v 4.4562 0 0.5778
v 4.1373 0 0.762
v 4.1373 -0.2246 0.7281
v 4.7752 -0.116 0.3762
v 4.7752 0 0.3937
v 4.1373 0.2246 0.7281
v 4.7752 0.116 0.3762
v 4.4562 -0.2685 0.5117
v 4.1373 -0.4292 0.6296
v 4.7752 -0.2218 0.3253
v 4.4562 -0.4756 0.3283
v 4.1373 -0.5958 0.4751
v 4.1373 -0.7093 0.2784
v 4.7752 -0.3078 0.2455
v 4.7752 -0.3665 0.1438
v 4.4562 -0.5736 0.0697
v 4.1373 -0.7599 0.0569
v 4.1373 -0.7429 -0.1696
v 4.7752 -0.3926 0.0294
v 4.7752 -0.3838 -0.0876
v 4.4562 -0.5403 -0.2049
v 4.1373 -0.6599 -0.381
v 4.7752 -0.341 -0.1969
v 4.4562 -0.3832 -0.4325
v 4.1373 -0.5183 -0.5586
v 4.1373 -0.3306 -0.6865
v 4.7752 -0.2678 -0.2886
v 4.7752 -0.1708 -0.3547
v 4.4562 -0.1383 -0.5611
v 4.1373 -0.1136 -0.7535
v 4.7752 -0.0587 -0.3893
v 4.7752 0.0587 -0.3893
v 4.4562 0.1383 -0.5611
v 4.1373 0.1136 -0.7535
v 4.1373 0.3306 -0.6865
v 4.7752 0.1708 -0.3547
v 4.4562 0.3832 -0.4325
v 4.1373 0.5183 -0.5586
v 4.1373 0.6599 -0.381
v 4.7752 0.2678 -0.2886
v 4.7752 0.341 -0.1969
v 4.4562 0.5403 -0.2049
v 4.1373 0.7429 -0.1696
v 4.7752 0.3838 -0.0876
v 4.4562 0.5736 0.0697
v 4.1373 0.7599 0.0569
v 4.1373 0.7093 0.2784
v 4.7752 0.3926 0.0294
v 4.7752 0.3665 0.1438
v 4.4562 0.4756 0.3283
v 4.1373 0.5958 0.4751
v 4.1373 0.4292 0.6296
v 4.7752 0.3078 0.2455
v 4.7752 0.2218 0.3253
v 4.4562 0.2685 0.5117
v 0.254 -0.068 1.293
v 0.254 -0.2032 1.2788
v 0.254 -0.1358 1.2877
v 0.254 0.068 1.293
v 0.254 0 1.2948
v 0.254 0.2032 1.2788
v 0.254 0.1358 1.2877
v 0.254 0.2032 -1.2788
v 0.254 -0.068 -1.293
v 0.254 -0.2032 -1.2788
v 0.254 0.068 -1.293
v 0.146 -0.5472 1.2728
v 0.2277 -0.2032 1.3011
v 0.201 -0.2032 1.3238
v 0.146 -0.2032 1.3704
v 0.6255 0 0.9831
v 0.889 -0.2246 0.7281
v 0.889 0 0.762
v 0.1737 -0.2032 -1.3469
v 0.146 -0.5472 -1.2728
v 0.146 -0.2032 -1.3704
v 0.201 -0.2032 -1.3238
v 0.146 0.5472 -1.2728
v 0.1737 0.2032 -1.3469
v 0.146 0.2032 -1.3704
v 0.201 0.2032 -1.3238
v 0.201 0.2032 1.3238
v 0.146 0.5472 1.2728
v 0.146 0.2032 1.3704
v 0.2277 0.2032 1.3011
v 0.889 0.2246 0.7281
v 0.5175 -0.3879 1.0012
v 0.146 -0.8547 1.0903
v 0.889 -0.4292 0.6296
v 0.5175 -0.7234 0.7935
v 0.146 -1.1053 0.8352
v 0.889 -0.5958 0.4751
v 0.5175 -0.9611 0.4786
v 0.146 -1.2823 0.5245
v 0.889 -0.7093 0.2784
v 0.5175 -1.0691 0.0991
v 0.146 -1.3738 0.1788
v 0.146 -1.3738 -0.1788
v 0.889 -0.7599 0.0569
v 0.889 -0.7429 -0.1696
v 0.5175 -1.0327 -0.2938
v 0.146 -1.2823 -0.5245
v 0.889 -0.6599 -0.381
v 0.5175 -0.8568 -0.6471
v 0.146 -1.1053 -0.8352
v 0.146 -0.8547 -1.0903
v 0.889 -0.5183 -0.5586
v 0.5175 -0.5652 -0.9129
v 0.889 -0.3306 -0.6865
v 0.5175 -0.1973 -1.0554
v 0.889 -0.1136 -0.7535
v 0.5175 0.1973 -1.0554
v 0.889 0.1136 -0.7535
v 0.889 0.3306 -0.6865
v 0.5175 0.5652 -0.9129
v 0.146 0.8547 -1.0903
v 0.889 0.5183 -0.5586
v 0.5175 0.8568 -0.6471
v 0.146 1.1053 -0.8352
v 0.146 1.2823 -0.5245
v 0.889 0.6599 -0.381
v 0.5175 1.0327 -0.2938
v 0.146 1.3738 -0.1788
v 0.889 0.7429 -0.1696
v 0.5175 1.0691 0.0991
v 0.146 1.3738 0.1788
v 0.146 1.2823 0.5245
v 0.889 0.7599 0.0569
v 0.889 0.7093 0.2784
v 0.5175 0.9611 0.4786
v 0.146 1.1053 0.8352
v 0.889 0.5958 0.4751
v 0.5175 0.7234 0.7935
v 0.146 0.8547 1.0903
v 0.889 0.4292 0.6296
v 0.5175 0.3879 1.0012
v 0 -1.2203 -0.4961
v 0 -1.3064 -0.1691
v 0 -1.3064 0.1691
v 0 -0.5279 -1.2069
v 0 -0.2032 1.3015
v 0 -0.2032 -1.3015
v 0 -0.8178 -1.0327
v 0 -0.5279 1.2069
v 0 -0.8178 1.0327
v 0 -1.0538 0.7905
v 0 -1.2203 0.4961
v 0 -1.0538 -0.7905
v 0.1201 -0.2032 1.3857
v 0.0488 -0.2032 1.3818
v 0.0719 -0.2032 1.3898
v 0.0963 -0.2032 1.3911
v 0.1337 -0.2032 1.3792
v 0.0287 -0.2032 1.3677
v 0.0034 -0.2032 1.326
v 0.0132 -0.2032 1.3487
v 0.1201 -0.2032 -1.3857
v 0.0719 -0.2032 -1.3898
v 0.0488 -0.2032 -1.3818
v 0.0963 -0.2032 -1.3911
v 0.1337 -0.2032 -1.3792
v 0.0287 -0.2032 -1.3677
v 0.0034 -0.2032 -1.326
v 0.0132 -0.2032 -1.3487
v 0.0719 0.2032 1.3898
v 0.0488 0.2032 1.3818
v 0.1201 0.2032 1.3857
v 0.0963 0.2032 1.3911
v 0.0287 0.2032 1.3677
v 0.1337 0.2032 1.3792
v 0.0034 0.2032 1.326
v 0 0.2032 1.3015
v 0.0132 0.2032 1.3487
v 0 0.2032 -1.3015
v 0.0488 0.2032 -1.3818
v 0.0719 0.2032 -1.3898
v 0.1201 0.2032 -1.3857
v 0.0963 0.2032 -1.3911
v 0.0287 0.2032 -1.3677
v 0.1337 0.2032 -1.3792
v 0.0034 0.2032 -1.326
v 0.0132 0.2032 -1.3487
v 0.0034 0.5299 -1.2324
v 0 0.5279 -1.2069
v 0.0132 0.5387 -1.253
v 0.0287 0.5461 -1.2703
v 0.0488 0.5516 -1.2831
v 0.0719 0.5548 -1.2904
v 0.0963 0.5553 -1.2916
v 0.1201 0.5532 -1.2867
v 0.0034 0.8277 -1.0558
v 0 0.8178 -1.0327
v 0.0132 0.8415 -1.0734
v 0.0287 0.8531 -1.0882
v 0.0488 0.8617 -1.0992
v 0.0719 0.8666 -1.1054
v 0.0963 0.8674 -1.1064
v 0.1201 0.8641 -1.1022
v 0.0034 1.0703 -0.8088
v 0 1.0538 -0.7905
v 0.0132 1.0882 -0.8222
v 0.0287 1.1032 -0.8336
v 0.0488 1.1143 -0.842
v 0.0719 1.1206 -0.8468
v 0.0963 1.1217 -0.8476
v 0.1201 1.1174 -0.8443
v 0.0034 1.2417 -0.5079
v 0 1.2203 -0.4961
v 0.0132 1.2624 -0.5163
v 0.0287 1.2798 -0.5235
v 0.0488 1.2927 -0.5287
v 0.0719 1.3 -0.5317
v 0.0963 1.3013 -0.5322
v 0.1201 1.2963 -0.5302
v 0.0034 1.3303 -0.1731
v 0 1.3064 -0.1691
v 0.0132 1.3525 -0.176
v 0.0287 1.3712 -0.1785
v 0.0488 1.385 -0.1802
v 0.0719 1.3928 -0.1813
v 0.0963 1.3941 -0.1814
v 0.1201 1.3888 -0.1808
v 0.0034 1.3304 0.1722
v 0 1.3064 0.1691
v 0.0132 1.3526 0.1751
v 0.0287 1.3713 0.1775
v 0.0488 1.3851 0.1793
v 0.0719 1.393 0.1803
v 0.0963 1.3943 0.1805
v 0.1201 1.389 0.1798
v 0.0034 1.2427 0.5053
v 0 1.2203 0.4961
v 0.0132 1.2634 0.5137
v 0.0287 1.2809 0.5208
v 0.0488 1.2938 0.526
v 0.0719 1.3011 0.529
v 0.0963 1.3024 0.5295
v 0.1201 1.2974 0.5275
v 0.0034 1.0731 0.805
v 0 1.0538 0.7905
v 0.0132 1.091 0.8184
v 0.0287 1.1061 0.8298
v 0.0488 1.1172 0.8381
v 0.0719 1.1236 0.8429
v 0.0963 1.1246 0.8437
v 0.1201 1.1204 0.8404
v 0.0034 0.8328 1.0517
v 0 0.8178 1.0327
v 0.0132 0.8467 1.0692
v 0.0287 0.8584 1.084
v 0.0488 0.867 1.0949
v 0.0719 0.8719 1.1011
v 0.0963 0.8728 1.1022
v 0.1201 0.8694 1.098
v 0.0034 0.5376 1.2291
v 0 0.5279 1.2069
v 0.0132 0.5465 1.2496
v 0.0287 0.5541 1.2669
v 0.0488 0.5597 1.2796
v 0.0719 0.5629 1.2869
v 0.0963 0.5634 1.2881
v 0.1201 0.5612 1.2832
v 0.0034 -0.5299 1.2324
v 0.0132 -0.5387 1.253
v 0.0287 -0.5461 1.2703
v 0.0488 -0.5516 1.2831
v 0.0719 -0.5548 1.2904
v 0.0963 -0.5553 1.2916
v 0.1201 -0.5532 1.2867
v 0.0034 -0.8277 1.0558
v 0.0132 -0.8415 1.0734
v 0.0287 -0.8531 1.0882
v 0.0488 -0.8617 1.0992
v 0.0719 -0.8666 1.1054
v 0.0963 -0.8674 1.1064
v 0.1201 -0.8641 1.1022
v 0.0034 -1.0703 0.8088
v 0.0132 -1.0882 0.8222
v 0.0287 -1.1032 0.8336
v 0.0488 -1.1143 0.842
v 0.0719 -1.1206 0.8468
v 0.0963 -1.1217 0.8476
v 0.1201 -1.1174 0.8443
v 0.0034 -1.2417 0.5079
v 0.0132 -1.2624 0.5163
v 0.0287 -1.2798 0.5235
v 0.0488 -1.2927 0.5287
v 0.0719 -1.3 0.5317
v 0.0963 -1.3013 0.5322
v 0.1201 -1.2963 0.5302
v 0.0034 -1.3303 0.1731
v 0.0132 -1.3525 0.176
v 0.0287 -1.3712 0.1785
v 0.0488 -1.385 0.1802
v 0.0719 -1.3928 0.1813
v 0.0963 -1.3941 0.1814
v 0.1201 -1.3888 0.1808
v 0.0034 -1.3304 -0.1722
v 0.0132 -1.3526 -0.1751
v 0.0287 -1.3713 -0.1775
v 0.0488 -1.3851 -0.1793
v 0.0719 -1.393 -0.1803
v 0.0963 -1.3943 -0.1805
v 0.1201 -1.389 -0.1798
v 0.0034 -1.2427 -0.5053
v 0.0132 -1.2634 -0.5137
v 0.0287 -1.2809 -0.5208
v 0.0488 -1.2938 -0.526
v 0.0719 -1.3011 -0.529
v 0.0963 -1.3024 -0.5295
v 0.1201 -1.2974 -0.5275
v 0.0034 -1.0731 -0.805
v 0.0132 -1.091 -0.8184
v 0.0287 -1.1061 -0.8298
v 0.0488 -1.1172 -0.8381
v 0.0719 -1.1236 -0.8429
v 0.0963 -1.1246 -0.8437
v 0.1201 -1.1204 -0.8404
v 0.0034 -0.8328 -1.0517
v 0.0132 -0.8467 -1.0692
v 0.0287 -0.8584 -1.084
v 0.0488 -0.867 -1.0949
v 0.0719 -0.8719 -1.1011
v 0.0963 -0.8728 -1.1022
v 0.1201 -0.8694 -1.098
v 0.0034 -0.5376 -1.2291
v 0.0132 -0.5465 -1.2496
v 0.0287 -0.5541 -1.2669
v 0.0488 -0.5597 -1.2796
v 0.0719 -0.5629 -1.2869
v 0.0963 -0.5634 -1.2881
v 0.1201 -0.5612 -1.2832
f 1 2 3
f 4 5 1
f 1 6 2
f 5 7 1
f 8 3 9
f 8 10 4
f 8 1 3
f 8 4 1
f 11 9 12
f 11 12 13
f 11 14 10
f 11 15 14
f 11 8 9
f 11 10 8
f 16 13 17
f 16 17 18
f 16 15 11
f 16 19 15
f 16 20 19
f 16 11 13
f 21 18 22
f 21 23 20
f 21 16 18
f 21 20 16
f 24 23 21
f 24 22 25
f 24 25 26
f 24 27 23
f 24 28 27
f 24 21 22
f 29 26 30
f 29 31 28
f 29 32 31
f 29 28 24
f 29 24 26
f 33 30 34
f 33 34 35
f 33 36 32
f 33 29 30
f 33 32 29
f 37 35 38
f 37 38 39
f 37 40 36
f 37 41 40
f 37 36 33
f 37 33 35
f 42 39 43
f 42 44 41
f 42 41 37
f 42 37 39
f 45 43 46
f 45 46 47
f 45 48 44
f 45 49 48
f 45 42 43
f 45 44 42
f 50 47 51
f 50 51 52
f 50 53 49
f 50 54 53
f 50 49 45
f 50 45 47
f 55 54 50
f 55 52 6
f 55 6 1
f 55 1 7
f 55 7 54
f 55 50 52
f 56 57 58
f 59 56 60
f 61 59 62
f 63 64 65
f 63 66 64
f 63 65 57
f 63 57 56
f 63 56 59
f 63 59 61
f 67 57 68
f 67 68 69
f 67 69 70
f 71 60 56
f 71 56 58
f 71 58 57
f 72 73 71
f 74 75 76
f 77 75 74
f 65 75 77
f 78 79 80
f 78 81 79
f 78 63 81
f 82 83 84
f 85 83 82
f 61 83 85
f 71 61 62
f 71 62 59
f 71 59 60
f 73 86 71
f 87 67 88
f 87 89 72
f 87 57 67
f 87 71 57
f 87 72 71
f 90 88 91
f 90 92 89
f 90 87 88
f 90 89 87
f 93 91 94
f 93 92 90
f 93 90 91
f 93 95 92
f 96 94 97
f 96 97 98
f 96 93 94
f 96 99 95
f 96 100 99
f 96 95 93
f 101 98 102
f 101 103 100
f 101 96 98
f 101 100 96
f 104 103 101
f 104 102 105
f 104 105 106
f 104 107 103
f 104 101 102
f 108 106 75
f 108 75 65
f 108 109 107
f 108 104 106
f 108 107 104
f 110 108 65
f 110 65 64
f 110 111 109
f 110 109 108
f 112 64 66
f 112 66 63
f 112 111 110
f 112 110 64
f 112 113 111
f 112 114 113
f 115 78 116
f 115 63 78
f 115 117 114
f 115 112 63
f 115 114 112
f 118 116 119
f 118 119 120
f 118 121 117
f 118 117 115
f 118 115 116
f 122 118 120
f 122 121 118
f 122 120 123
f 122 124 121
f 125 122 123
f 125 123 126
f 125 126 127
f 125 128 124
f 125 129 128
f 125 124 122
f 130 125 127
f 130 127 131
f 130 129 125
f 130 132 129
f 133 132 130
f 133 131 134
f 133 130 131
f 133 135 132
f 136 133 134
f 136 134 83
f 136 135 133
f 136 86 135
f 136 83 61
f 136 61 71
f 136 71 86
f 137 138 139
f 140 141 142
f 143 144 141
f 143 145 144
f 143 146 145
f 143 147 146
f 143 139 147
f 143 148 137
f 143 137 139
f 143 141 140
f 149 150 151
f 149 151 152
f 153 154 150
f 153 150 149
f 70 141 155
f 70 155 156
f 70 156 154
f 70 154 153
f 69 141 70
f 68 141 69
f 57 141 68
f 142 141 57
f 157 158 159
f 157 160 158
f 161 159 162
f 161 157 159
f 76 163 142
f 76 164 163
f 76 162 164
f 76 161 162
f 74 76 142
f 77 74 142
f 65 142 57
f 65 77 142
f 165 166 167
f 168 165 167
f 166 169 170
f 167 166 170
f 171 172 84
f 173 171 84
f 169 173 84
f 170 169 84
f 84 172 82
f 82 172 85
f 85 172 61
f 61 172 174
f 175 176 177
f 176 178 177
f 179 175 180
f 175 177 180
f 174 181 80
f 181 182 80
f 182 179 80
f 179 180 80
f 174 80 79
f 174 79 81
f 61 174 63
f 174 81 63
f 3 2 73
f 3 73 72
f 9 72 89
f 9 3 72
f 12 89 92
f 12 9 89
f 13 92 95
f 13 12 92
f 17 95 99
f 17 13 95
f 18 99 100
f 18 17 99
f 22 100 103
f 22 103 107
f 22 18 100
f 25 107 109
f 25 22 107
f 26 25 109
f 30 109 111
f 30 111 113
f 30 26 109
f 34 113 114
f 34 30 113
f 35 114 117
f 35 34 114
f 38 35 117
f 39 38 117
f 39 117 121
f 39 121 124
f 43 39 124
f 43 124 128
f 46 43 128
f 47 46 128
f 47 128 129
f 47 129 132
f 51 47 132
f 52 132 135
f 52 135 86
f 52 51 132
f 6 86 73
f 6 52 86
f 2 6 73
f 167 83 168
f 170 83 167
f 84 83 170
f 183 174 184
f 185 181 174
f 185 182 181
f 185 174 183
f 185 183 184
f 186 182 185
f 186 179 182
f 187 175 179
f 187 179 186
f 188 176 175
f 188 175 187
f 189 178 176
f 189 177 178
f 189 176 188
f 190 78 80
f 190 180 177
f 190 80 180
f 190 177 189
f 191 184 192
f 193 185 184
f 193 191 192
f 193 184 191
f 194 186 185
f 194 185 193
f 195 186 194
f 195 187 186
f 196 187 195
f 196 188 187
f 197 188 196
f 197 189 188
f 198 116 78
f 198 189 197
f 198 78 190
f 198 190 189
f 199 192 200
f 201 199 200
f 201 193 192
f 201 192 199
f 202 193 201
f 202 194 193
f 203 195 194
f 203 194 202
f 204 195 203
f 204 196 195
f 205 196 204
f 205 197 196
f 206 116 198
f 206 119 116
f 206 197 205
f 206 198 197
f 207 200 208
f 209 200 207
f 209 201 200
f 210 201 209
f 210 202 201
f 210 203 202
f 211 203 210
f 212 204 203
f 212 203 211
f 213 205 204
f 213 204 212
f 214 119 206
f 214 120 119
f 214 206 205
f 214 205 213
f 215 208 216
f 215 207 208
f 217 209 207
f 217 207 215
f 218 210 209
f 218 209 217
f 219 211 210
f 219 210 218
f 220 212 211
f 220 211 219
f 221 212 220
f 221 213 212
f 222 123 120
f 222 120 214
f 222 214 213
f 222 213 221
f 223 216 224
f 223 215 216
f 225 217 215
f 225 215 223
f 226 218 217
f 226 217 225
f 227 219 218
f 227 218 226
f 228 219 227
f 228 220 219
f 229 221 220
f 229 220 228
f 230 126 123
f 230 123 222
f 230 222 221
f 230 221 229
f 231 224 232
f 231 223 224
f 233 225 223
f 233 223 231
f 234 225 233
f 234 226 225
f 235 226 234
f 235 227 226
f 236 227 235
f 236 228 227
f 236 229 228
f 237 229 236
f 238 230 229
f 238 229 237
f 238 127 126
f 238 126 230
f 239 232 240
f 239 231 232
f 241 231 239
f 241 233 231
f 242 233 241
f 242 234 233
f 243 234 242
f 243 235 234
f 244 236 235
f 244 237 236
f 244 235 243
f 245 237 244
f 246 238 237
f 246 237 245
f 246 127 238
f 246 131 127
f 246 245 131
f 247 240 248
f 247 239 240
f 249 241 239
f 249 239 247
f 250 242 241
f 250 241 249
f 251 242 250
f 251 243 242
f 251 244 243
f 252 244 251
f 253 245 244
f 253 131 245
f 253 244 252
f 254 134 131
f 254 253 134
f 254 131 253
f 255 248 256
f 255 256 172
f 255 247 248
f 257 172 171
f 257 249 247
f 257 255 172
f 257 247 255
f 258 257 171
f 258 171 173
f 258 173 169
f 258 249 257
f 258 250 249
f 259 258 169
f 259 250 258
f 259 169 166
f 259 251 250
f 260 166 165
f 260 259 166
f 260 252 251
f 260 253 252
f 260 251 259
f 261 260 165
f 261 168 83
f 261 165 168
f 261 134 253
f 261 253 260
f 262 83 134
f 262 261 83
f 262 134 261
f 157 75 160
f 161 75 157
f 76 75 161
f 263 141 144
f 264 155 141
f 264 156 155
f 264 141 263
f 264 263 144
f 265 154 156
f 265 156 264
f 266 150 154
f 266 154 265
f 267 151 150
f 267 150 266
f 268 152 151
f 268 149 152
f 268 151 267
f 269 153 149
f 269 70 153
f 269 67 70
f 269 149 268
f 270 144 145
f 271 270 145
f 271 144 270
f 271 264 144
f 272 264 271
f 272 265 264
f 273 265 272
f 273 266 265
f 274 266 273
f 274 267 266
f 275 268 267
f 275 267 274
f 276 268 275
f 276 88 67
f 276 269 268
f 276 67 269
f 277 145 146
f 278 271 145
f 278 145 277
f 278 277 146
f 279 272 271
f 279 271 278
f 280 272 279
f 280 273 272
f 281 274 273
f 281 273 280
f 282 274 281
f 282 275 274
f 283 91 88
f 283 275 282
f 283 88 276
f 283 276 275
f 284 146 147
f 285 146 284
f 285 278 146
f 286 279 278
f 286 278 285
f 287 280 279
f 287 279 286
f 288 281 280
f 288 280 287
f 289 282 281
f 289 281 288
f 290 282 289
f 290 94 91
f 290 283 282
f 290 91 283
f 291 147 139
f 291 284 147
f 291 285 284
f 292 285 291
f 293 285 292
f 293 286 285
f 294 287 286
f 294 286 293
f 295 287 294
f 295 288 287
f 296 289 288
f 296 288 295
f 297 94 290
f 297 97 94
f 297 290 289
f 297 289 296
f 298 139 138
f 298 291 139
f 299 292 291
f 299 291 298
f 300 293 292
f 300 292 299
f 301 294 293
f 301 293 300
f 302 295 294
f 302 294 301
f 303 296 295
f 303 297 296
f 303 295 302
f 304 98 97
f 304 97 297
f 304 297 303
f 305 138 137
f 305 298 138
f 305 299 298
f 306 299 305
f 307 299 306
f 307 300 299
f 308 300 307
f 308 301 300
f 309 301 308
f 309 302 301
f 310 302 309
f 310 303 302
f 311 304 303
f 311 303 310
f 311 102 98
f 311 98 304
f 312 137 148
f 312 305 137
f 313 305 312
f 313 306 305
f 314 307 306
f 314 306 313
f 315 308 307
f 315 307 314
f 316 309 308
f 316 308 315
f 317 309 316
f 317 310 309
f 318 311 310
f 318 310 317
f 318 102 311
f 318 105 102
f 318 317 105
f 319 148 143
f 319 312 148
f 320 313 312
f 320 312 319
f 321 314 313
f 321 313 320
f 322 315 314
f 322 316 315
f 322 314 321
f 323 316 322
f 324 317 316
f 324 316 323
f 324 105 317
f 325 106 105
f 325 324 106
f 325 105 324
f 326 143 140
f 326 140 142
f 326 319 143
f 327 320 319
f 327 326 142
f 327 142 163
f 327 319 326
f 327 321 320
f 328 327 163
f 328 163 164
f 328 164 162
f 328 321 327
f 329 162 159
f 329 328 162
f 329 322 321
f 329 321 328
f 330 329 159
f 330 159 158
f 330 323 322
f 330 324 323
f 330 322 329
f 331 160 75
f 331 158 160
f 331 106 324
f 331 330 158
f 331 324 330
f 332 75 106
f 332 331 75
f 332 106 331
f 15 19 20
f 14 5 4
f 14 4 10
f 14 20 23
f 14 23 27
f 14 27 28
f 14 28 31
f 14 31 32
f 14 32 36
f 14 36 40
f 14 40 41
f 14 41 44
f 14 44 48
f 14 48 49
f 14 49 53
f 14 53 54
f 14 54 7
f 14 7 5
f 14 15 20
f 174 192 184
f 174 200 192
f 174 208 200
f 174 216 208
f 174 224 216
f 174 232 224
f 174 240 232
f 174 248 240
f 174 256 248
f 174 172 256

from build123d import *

# Parameters (mm, degrees)
SLOT_CUT_EXTRUDE1_DEPTH      = 6.172756043
SLOT_CUT_EXTRUDE1_DEPTH_BACK = 6.172756043
SKETCH2_W                    = 0.254
SKETCH2_H                    = 0.4064


with BuildPart() as part:
    # Sketch1 → base-Revolve (revolve)
    with BuildSketch(Plane.XY, mode=Mode.PRIVATE) as base_revolve_sk:
        with BuildLine():
            Line((0, 0), (0, 1.317312907))
            ThreePointArc((0, 1.317312907), (0.051329237, 1.397883669), (0.146043819, 1.385414258))
            Line((0.146043819, 1.385414258), (0.889, 0.762))
            Line((0.889, 0.762), (4.7752, 0.762))
            Line((4.7752, 0.762), (4.7752, 0))
            Line((4.7752, 0), (0, 0))
        make_face()
    revolve(base_revolve_sk.sketch.rotate(Axis((0, 0, 0), (1, 0, 0)), 90), axis=Axis((0, 0, 0), (1, 0, 0)))

    # Sketch2 → slot_Cut-Extrude1 (cut, two sides: drawn at the far end of the back side and taken through both)
    with BuildSketch(Plane.XY.offset(-SLOT_CUT_EXTRUDE1_DEPTH_BACK)):
        with Locations((0.127, 0)):
            Rectangle(SKETCH2_W, SKETCH2_H)
    extrude(amount=SLOT_CUT_EXTRUDE1_DEPTH + SLOT_CUT_EXTRUDE1_DEPTH_BACK, mode=Mode.SUBTRACT)

    # Sketch8 → point_Cut-Revolve1 (revolve, cut)
    with BuildSketch(Plane.XY, mode=Mode.PRIVATE) as point_cut_revolve1_sk:
        Polygon((4.7752, 0), (5.2832, 0), (5.2832, 1.27), (4.137285688, 1.27), (4.137285688, 0.762), (4.7752, 0.3937), align=None)
    revolve(point_cut_revolve1_sk.sketch.rotate(Axis((0, 0, 0), (1, 0, 0)), 90), axis=Axis((0, 0, 0), (1, 0, 0)), mode=Mode.SUBTRACT)


solid = part.part
